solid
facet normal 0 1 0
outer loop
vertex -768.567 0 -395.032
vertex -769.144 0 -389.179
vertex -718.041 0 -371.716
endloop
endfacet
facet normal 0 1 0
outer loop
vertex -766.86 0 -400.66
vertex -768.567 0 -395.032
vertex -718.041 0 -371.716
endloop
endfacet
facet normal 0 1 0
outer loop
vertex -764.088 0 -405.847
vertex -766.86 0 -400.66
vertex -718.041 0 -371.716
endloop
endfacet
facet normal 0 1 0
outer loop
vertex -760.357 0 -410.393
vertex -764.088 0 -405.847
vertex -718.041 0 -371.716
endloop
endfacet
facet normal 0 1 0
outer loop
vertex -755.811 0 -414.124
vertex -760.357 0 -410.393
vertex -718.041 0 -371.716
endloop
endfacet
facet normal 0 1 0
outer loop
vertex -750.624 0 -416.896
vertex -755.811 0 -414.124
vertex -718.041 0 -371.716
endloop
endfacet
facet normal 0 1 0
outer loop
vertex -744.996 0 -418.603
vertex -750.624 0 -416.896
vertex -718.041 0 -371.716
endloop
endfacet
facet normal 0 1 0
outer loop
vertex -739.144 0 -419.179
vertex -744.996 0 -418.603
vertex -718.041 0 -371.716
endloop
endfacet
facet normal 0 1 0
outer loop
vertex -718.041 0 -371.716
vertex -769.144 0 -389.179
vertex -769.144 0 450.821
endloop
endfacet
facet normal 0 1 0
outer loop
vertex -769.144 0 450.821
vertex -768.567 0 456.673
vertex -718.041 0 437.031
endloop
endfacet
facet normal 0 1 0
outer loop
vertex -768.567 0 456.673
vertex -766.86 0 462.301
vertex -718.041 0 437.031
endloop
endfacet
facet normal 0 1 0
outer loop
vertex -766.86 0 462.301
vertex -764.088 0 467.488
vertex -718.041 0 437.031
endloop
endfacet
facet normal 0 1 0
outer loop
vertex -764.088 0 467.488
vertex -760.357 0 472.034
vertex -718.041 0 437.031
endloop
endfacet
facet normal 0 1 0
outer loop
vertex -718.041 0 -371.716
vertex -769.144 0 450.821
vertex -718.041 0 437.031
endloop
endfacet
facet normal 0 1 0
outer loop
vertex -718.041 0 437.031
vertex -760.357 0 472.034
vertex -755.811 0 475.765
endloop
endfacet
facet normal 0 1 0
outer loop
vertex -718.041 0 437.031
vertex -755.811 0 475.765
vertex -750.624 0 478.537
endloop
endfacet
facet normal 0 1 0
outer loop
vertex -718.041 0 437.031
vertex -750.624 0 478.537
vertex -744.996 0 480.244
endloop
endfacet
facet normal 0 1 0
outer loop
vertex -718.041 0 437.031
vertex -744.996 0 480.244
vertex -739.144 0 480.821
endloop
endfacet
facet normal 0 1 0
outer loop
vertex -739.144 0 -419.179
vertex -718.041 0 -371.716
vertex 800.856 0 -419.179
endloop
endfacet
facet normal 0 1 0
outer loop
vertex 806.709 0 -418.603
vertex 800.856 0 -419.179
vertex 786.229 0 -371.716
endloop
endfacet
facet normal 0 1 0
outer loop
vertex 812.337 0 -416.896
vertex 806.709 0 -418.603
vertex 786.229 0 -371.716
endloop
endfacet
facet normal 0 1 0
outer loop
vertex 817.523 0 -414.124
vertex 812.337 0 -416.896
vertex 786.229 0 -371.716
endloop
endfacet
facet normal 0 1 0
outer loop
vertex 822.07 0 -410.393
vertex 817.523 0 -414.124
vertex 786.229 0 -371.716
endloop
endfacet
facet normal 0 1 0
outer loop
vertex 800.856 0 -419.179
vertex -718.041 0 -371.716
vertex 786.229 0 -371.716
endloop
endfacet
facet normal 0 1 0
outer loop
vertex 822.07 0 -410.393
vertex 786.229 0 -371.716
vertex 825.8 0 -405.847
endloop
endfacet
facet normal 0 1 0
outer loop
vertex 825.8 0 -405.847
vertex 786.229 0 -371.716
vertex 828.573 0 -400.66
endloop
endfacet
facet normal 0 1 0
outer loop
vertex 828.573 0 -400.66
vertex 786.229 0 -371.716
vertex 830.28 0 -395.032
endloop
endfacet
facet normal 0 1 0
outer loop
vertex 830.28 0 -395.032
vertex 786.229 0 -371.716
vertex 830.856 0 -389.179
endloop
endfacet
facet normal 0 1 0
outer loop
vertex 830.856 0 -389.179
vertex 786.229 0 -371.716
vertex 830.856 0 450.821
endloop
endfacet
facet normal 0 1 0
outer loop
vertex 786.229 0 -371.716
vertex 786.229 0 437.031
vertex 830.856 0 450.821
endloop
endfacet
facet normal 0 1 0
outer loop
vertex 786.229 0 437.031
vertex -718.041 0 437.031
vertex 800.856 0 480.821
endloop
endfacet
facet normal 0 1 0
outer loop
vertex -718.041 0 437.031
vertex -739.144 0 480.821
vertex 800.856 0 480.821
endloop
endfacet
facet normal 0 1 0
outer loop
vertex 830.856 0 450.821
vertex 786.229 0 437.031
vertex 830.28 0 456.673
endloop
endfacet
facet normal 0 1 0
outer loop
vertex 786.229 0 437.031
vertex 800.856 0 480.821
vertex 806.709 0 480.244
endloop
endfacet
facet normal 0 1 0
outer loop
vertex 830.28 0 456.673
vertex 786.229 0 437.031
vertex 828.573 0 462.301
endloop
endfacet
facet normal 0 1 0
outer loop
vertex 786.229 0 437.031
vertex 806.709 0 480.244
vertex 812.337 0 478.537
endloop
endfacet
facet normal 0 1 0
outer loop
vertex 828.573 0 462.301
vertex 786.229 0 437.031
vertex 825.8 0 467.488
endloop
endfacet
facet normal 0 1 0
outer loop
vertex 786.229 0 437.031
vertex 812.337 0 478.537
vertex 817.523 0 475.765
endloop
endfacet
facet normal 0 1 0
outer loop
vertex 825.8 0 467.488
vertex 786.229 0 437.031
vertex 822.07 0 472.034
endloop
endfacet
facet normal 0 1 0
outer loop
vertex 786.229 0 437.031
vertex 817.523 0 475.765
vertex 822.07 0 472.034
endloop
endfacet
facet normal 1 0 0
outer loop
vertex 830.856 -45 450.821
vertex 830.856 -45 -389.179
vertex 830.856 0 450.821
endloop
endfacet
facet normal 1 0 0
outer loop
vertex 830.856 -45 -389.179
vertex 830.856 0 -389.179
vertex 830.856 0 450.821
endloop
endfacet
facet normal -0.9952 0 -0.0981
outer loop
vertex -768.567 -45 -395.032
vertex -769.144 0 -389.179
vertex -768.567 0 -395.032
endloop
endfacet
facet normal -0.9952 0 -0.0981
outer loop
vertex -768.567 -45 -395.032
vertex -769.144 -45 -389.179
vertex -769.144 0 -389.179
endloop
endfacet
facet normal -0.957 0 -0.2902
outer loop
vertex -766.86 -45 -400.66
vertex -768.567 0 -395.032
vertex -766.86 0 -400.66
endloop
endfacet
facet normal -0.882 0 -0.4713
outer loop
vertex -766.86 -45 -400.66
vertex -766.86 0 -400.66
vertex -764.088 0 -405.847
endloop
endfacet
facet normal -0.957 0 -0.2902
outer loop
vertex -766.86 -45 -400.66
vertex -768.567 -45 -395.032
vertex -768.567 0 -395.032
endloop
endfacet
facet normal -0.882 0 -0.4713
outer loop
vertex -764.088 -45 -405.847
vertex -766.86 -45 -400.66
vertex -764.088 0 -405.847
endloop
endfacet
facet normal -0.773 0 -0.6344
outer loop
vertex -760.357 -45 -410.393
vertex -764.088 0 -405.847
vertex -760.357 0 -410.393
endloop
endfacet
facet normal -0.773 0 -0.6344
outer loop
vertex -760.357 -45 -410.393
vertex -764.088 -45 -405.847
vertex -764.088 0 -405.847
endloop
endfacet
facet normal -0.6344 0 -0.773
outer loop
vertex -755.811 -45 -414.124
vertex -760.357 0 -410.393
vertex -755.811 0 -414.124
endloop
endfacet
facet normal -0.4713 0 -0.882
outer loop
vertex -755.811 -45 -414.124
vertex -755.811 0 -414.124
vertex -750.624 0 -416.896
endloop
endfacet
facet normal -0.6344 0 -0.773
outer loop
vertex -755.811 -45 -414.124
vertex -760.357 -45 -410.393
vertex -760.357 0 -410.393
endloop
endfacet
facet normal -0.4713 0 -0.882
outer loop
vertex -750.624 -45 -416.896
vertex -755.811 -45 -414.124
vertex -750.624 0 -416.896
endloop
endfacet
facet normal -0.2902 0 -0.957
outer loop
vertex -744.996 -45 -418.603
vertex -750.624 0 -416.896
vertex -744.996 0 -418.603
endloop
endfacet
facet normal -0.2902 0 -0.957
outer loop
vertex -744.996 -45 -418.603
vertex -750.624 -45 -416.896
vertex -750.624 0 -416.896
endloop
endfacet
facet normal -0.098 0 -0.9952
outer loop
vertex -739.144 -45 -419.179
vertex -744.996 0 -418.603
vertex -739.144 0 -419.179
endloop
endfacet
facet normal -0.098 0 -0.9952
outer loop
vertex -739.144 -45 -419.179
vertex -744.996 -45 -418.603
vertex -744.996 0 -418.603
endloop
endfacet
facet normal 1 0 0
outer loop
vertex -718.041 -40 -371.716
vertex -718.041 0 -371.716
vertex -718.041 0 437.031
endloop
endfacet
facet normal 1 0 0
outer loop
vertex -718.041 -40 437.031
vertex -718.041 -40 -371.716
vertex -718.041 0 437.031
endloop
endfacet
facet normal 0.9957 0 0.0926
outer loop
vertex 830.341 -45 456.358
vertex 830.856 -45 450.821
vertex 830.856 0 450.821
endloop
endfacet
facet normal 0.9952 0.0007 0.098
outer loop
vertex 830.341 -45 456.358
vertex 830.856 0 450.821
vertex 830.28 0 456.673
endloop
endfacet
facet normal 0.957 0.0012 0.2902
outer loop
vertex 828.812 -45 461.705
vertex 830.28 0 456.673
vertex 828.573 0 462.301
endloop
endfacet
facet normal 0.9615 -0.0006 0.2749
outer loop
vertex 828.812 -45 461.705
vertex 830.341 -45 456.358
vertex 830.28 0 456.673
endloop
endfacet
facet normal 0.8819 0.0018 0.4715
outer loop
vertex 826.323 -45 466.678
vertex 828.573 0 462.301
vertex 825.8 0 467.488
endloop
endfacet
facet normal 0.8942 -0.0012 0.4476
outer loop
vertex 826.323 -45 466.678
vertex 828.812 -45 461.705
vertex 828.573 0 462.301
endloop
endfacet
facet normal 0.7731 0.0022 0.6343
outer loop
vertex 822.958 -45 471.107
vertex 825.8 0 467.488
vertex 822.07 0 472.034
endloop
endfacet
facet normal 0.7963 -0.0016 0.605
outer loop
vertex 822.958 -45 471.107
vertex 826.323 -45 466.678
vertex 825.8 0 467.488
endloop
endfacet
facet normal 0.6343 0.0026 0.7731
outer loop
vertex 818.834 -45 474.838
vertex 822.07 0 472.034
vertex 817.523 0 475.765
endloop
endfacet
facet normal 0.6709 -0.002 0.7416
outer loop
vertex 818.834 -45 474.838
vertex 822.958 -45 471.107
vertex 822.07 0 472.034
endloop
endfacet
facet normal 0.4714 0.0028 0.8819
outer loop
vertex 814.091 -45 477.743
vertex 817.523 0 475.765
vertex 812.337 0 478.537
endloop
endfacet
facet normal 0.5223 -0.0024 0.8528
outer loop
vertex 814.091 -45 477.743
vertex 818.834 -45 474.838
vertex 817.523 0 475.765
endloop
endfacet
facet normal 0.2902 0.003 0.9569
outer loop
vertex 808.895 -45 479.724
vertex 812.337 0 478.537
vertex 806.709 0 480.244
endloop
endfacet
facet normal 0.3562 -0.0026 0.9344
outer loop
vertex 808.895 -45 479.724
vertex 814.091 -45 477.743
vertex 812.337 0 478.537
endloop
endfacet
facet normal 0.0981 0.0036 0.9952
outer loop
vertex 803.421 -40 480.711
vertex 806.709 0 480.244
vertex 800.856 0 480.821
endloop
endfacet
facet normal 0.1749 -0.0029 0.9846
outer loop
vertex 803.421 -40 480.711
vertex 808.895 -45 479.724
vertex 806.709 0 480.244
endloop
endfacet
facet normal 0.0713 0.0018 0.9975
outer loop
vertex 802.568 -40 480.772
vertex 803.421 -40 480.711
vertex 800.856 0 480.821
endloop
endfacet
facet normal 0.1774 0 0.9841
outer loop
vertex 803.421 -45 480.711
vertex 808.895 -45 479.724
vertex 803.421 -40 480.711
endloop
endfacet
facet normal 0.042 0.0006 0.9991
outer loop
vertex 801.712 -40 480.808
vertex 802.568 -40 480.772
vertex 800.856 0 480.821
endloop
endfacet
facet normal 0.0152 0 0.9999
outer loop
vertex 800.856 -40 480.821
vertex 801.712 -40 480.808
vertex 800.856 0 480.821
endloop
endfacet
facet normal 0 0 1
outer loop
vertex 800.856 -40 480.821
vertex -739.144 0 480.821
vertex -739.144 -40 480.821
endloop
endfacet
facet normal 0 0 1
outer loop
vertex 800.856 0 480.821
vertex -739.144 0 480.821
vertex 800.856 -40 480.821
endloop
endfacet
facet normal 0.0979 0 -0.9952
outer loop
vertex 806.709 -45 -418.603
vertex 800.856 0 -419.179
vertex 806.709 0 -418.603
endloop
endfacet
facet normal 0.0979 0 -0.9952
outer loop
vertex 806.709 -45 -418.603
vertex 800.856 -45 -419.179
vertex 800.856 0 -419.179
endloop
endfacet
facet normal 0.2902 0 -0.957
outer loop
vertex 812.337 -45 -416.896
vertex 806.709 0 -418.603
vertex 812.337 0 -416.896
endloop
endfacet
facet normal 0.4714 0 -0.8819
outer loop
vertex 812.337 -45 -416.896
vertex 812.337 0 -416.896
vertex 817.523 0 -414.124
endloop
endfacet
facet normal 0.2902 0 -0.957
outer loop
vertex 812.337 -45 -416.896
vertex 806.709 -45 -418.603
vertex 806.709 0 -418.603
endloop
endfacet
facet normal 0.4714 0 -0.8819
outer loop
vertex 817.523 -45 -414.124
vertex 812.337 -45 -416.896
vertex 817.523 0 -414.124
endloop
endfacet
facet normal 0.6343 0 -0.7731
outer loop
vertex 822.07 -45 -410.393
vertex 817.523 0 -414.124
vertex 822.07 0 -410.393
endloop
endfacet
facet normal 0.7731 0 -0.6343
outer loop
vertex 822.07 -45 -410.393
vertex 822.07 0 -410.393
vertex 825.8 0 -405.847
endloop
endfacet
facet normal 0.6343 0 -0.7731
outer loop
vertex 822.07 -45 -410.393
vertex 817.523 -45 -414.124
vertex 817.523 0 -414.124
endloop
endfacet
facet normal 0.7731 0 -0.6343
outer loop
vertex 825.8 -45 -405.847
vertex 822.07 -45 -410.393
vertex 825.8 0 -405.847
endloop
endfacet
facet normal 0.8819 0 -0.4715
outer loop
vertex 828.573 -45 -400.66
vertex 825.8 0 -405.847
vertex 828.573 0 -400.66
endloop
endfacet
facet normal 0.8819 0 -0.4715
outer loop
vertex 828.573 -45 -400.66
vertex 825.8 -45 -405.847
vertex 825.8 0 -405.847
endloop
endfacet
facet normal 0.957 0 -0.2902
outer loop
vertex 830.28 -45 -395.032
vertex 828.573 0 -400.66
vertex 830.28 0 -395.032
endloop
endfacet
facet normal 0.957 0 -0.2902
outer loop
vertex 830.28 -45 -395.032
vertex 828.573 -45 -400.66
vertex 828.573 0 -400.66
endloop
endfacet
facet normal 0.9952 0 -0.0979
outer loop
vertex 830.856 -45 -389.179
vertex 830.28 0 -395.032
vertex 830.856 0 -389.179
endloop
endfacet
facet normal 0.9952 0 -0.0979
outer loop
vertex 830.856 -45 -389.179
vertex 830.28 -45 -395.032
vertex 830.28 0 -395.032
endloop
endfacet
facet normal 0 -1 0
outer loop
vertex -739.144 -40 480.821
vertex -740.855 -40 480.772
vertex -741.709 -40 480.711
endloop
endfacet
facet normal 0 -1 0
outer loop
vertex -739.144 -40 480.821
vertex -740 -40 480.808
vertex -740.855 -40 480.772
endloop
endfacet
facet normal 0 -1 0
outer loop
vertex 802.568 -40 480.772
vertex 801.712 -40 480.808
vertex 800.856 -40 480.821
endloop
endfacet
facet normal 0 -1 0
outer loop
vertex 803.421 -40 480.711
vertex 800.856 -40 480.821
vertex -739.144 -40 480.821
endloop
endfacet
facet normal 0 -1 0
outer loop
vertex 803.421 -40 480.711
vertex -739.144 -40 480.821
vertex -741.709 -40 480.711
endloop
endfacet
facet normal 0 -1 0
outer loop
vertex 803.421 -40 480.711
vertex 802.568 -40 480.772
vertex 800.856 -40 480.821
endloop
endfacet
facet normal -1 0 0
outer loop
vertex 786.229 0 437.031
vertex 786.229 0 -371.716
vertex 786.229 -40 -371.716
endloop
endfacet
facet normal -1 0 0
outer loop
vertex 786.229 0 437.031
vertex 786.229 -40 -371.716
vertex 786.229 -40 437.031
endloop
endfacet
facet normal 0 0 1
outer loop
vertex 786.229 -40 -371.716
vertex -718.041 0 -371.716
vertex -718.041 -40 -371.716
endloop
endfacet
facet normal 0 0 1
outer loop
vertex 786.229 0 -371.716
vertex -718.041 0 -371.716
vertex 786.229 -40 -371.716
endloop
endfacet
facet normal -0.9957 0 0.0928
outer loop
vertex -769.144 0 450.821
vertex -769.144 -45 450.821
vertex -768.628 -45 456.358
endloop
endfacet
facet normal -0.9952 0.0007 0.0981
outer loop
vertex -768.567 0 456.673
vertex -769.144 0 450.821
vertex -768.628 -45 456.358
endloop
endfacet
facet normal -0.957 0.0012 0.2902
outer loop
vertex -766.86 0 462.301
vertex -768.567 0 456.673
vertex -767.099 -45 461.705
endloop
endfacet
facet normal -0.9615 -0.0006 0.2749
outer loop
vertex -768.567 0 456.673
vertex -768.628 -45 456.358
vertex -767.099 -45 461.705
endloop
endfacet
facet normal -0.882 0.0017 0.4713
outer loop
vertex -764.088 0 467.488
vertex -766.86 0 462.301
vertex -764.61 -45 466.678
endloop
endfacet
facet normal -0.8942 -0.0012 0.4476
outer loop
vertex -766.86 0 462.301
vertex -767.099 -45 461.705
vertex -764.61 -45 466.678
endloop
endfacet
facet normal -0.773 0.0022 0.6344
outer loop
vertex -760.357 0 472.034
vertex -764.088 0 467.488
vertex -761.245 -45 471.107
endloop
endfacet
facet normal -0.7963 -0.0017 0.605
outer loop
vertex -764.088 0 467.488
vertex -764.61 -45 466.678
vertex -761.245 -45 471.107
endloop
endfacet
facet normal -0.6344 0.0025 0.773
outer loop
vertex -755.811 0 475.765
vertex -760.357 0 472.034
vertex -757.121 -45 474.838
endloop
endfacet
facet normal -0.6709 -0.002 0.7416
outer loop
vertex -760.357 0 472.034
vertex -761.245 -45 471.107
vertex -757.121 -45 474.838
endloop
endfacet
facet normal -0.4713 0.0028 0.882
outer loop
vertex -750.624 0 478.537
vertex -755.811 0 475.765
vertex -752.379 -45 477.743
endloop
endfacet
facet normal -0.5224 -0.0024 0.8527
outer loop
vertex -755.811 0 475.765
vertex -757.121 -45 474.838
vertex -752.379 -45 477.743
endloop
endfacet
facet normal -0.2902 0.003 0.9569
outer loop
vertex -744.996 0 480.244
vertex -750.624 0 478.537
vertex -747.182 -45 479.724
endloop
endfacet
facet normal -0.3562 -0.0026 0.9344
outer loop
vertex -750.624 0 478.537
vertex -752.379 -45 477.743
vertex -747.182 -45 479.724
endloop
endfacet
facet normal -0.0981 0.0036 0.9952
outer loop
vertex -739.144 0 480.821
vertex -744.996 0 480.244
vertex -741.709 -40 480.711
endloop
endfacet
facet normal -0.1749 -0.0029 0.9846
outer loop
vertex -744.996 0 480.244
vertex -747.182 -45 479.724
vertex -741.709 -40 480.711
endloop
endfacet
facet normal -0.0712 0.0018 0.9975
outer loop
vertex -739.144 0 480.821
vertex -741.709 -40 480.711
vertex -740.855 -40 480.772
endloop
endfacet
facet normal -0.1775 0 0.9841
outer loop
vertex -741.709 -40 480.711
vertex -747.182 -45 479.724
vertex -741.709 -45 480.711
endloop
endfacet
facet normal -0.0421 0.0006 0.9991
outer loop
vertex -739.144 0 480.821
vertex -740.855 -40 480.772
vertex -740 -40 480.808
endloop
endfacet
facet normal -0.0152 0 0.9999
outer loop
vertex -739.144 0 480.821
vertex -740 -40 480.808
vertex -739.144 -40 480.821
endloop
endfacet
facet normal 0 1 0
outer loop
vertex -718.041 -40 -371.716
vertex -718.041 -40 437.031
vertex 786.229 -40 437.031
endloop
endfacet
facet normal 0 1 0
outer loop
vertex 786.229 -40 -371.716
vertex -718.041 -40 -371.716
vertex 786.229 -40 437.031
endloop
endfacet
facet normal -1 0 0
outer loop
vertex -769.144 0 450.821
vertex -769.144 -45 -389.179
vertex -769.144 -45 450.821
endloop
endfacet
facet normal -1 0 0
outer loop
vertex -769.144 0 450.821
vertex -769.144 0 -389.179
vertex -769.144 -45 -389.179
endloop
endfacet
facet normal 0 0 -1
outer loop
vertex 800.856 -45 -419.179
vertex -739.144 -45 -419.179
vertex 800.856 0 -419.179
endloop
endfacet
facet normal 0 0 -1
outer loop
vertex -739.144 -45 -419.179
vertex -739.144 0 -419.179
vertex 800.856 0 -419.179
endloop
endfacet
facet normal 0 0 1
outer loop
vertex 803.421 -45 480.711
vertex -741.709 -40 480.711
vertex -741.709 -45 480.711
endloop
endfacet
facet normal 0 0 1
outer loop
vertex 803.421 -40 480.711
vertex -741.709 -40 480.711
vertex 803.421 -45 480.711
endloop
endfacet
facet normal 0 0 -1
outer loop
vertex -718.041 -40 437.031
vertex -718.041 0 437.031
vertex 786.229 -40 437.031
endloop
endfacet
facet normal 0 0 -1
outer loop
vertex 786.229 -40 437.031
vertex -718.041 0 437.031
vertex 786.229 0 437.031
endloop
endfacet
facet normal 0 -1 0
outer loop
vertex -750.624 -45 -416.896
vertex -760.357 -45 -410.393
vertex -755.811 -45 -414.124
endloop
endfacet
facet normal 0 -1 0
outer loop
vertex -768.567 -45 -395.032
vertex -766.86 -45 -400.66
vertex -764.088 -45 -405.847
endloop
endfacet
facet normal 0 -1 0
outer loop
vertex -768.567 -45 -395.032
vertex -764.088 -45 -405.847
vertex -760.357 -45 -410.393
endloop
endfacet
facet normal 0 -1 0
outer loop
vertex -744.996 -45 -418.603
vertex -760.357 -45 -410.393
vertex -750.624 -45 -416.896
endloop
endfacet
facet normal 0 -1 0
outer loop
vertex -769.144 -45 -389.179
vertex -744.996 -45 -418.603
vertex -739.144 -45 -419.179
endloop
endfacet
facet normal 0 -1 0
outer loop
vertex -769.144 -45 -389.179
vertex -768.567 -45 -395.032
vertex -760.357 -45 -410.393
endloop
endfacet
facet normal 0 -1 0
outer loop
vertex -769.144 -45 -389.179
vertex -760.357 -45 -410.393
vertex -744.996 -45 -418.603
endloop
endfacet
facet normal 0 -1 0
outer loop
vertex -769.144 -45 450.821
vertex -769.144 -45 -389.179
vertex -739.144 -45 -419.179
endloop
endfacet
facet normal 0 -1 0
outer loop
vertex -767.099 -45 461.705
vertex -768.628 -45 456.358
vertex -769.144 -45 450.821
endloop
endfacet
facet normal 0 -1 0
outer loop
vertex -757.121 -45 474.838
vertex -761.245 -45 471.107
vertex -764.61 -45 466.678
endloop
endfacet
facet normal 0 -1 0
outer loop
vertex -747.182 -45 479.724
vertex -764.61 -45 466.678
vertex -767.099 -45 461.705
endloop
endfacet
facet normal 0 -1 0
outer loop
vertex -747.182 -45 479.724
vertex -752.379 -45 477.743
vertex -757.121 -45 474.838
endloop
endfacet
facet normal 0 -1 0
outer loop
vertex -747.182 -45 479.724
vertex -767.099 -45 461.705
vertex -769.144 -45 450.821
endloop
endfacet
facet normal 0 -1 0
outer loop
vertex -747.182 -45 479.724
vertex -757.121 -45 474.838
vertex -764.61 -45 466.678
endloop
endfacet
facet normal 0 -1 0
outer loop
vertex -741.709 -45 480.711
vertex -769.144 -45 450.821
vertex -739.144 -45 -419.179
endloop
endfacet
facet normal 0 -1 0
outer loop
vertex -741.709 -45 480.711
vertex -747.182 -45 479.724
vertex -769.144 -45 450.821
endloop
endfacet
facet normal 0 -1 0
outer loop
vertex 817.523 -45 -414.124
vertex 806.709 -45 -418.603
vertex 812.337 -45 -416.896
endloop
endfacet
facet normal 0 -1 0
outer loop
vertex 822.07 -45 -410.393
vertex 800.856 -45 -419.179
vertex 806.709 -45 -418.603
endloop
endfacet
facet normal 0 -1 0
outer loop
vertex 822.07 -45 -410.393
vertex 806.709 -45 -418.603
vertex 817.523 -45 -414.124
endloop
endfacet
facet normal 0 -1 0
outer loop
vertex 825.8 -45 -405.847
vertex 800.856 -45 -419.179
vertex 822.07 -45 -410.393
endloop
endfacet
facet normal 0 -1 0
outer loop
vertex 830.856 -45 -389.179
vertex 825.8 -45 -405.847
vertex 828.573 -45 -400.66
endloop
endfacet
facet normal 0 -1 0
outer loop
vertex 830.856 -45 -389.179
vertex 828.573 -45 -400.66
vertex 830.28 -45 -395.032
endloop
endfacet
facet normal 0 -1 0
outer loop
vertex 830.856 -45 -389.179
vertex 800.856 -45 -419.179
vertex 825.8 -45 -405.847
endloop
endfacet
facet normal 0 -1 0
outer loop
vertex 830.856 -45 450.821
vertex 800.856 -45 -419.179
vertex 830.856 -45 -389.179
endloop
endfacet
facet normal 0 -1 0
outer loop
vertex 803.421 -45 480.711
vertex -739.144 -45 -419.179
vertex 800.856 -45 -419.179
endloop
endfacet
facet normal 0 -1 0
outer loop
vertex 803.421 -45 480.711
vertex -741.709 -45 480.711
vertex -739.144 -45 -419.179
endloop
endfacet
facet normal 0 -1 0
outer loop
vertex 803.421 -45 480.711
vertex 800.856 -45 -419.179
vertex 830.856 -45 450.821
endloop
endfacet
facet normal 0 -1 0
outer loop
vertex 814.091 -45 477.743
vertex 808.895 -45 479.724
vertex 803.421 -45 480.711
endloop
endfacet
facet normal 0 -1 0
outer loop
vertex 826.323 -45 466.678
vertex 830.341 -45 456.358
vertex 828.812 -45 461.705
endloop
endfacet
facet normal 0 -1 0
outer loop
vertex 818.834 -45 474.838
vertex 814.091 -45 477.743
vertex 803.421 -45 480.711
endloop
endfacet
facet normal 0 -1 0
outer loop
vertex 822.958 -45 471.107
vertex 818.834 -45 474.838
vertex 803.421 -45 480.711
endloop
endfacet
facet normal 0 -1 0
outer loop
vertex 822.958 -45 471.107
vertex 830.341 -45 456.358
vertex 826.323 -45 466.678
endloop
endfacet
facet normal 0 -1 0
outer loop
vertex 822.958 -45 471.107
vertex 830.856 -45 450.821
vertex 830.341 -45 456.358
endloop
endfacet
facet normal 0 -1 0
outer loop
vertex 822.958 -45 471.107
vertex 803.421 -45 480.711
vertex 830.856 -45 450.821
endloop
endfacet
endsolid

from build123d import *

# Parameters (mm, degrees)
F0_W     = 1600
F0_H     = 900
F0_W_2   = 1504.2692422867
F0_H_2   = 808.7469339371
F1_DEPTH = 40
F2_W     = 1600
F2_H     = 899.8901372014
F3_DEPTH = 5
F4_R     = 30


with BuildPart() as f1:
    # F0 (on Front) → F1 (new body)
    with BuildSketch(Plane.XZ):
        with Locations((30.8563187718, 30.8205480518)):
            Rectangle(F0_W, F0_H)
        with Locations((34.0940356255, 32.6578398405)):
            Rectangle(F0_W_2, F0_H_2, mode=Mode.SUBTRACT)
    extrude(amount=F1_DEPTH)

    # F2 (on face) → F3 (join)
    with BuildSketch(Plane.XZ.offset(40)):
        with Locations((30.8563187718, 30.7656166525)):
            Rectangle(F2_W, F2_H)
    extrude(amount=F3_DEPTH)

    # F4
    f4_edges = [f1.edges().sort_by_distance(p)[0] for p in [
        (830.856319, -22.5, -419.179452),
        (-769.143681, -22.5, -419.179452),
        (-769.143681, -20, 480.820548),
        (830.856319, -20, 480.820548),
    ]]
    fillet(f4_edges, radius=F4_R)


solid = f1.part
